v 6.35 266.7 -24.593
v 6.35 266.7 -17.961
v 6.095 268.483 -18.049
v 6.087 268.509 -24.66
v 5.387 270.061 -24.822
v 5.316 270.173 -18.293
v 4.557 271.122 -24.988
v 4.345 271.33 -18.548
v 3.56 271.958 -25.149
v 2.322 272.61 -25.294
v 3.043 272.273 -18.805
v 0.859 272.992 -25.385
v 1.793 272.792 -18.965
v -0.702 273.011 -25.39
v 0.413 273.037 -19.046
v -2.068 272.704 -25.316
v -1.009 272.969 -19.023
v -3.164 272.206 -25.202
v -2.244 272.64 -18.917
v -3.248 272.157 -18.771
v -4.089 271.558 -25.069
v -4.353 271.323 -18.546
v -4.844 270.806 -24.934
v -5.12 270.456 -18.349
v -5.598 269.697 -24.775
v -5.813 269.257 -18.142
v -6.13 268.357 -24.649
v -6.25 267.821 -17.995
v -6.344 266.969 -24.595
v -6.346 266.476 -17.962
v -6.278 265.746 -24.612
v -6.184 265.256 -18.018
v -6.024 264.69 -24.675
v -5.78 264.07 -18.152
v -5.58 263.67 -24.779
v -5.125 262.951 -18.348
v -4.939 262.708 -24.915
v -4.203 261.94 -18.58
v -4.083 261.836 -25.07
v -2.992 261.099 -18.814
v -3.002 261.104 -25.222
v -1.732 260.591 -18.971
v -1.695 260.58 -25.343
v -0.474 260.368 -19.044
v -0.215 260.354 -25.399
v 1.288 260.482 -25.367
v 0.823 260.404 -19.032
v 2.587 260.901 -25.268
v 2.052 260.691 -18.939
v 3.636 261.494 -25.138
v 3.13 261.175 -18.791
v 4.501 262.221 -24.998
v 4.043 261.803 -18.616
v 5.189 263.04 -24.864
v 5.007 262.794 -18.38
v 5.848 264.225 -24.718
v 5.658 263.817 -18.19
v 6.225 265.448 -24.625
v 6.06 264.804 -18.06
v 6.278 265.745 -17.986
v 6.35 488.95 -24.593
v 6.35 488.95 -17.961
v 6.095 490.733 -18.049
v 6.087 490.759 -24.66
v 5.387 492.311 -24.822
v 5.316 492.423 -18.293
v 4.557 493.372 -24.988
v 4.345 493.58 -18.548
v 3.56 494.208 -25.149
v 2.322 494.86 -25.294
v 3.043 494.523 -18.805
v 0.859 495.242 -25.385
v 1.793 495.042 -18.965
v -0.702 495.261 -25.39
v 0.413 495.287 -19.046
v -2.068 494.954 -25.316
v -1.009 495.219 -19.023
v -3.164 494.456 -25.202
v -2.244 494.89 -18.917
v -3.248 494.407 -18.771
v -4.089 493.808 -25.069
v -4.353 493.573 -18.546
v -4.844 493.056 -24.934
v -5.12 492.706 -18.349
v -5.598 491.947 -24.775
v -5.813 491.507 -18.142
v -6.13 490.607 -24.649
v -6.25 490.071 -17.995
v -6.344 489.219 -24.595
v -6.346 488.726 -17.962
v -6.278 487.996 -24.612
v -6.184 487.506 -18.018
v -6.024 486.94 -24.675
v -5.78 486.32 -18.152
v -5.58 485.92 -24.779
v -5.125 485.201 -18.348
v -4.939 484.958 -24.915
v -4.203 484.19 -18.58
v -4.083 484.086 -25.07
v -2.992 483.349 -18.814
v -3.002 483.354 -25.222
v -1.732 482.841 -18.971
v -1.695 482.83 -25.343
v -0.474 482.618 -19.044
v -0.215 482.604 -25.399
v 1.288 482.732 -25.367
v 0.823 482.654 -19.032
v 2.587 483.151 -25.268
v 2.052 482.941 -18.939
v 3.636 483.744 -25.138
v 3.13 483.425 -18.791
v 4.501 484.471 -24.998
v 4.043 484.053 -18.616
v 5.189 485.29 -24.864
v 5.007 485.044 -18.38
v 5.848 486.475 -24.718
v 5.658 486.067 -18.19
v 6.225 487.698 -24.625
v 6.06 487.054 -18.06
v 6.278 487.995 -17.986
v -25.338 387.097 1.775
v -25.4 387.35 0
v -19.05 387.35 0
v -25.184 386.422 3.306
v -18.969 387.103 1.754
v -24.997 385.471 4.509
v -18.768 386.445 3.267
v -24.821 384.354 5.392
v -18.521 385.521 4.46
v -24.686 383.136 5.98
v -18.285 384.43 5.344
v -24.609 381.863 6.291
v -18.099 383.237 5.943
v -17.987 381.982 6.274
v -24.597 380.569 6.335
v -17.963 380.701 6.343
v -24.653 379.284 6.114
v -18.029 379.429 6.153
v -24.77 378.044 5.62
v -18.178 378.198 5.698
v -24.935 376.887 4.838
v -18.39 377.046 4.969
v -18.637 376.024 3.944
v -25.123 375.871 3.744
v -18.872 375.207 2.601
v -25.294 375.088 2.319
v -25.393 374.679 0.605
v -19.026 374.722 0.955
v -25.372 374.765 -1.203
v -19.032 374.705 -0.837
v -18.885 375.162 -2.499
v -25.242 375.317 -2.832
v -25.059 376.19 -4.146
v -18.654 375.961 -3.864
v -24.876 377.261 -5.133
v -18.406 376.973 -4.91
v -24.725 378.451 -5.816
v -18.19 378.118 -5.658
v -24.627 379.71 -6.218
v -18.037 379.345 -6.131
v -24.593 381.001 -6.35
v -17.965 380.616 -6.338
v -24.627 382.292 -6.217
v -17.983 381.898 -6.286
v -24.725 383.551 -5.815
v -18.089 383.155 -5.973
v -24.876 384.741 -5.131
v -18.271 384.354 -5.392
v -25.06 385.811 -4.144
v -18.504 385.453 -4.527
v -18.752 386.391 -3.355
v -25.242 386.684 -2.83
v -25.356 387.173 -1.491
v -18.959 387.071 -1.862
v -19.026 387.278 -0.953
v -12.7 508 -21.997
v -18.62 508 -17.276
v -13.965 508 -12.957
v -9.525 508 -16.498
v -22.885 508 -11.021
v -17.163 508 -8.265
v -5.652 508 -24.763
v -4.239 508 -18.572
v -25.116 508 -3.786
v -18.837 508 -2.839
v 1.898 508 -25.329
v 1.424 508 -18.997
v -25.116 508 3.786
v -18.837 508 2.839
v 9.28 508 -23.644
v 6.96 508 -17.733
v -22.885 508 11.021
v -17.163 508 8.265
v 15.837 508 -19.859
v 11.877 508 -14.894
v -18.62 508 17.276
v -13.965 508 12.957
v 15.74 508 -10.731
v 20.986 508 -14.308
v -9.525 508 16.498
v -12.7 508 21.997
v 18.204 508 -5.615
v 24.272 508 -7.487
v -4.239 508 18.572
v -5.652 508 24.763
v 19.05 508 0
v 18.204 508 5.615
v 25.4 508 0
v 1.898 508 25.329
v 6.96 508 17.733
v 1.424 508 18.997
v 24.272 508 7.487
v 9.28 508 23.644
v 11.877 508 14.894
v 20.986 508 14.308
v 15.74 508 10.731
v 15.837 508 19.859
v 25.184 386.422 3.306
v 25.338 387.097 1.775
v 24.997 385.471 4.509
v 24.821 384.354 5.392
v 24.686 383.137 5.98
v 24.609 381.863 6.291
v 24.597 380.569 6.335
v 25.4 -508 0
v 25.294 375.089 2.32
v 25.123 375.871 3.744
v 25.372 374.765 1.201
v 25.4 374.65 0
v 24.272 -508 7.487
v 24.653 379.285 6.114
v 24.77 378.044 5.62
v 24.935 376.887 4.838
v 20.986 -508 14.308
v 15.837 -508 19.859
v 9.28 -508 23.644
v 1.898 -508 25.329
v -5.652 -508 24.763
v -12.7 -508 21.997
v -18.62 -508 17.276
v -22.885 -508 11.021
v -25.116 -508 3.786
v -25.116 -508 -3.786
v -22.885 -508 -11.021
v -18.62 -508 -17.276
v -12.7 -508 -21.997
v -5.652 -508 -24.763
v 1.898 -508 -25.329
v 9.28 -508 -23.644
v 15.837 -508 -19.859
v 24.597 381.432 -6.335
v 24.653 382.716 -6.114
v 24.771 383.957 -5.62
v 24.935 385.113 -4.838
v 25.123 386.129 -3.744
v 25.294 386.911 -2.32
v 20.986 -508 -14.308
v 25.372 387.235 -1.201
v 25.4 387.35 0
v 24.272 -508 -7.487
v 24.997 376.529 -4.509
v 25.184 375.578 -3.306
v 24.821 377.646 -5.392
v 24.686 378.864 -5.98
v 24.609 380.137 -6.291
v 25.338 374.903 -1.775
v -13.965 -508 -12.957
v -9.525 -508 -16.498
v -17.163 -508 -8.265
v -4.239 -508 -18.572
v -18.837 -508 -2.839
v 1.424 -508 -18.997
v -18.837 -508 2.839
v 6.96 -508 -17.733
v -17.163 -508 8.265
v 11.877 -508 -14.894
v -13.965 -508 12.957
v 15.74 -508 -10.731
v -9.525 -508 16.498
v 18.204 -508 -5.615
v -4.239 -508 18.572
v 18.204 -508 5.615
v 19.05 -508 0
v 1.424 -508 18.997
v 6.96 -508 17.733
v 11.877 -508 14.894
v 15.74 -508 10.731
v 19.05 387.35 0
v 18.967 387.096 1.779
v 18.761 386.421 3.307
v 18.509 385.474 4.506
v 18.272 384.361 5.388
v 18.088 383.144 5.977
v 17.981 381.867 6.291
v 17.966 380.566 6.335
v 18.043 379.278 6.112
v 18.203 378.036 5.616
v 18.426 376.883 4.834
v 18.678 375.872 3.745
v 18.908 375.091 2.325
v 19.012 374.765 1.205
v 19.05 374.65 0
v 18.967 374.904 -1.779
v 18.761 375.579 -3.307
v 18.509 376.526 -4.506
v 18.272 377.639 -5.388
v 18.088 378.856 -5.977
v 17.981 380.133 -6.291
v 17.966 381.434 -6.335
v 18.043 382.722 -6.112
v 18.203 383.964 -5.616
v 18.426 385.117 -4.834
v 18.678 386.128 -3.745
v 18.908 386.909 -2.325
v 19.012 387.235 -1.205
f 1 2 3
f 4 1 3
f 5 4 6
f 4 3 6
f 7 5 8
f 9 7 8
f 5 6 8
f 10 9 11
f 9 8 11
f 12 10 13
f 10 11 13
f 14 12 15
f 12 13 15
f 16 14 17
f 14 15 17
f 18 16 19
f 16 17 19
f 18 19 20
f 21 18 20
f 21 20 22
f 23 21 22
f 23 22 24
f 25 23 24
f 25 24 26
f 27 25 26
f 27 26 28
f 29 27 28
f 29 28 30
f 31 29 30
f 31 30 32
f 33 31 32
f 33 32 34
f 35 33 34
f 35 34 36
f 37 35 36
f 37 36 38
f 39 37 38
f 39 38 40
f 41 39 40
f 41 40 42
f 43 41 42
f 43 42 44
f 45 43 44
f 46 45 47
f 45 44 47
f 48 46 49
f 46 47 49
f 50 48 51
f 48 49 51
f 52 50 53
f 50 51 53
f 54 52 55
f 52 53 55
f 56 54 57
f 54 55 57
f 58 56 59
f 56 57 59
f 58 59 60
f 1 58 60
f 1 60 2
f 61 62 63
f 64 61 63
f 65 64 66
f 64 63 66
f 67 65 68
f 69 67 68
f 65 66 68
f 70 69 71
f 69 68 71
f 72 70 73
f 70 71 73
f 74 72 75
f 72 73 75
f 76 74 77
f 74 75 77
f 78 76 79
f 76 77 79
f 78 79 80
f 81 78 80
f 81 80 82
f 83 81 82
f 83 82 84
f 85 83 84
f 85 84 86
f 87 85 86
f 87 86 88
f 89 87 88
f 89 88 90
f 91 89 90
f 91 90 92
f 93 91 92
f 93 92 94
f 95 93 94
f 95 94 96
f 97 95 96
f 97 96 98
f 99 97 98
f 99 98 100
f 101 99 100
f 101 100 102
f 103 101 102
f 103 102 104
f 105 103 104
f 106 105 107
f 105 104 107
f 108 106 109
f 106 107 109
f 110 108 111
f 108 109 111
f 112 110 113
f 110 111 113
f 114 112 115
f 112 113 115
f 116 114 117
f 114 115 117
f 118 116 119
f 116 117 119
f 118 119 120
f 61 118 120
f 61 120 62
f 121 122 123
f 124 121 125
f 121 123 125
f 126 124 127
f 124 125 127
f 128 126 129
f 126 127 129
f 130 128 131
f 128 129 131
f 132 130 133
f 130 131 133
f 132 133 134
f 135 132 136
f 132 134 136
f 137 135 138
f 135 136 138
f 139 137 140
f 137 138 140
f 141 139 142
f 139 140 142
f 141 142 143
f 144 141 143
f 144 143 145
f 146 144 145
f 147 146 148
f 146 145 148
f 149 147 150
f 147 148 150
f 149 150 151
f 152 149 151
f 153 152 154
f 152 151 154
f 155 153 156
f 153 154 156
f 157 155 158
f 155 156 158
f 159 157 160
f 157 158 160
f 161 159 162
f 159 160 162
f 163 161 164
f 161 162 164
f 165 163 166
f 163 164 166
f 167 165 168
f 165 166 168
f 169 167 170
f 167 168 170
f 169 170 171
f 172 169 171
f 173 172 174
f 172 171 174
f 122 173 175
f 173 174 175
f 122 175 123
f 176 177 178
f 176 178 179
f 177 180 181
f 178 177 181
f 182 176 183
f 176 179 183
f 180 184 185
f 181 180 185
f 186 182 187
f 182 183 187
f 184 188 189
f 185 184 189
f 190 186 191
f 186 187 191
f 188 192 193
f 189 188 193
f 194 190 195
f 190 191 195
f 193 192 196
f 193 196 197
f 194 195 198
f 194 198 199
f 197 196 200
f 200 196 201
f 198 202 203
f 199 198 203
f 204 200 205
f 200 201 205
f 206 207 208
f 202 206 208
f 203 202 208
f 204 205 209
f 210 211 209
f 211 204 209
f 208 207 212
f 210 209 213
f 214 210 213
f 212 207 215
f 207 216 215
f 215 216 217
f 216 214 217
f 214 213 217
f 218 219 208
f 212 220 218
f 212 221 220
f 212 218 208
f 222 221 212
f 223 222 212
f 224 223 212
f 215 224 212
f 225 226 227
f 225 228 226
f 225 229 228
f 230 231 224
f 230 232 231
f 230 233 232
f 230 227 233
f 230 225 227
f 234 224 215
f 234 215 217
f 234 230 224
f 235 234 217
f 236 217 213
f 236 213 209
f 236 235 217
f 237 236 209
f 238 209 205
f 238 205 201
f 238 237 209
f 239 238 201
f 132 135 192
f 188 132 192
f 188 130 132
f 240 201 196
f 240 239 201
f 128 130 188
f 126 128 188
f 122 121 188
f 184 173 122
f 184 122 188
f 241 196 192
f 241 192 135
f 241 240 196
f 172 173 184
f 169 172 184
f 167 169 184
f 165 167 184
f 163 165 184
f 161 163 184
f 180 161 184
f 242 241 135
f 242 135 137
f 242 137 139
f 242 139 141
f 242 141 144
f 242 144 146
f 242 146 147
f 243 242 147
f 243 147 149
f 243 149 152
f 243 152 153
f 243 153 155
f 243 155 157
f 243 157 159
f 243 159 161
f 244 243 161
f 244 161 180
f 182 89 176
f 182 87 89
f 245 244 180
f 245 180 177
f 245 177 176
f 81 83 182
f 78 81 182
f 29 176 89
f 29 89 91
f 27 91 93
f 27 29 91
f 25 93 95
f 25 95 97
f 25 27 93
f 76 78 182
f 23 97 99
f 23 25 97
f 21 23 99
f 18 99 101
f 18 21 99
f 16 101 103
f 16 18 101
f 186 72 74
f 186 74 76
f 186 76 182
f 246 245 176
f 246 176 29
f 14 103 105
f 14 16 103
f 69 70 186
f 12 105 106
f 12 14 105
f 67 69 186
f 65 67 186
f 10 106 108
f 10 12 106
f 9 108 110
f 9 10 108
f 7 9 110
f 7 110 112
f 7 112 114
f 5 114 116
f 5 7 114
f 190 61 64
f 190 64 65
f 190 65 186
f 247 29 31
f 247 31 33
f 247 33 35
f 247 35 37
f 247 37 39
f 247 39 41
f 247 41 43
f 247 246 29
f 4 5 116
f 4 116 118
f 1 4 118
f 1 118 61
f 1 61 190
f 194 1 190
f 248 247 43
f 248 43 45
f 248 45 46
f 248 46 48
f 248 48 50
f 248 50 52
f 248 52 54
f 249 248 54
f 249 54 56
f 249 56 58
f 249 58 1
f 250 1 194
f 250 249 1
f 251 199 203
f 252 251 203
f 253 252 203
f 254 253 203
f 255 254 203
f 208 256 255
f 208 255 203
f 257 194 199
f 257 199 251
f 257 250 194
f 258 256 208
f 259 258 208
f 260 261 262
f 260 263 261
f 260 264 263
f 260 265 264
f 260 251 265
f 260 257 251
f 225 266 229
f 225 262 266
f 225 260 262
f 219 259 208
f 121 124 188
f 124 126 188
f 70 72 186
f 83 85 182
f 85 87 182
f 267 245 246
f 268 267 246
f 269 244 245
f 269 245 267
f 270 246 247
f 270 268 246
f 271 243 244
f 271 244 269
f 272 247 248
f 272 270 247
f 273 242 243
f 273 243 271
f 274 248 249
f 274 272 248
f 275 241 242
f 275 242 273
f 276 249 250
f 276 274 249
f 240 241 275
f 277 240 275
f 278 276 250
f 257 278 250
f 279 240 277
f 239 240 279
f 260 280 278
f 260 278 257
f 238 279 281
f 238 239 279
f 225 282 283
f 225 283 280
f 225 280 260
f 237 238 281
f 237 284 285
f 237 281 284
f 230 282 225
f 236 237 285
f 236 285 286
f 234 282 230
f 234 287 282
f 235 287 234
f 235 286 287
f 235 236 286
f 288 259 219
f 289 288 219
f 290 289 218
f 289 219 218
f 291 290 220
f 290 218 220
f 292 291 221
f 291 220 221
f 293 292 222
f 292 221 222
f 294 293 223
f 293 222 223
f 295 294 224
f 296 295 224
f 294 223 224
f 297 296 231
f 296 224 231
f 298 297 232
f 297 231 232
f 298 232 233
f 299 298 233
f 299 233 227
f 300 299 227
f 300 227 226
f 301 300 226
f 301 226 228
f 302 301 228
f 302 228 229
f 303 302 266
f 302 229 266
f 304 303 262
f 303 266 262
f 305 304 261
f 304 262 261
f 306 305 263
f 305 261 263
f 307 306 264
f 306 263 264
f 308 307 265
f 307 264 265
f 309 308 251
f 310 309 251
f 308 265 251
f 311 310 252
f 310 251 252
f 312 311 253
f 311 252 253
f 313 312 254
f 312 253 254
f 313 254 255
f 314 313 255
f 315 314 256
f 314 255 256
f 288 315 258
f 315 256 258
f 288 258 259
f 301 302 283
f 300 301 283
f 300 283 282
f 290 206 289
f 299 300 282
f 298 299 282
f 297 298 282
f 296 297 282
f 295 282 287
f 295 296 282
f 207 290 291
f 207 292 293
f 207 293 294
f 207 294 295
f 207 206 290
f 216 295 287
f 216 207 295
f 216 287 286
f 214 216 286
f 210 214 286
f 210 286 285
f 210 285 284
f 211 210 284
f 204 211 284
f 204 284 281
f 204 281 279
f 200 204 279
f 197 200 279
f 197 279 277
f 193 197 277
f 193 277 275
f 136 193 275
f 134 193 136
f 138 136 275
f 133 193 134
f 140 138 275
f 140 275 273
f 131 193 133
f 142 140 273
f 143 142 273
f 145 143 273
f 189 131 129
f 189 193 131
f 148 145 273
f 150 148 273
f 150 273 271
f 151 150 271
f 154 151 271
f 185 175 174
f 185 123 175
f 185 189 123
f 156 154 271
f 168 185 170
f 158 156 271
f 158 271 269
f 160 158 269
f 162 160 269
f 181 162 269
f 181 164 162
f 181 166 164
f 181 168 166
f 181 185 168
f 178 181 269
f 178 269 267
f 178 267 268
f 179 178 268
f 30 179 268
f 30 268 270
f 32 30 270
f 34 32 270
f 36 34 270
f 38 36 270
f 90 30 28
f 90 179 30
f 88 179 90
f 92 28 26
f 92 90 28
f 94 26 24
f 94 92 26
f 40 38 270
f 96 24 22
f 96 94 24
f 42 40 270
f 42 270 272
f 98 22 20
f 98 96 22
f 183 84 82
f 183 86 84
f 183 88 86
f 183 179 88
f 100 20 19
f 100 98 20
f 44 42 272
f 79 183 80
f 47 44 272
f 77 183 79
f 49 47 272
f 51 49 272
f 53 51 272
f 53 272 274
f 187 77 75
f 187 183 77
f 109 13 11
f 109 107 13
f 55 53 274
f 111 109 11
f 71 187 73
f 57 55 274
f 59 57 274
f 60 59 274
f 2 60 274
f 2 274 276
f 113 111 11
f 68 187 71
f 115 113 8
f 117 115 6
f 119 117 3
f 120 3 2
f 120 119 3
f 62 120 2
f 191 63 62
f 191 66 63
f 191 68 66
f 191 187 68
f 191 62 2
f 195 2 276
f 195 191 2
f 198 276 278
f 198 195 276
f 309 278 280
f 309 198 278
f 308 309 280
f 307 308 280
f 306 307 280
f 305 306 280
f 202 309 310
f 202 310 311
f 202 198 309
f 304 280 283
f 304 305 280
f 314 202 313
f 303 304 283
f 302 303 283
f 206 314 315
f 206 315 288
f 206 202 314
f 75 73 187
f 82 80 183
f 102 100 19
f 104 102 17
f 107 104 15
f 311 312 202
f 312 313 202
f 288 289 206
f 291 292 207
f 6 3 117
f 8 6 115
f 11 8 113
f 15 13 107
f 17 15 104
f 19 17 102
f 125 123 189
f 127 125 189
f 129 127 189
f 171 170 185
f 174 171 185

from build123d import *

# Parameters (mm, degrees)
F0_R     = 25.4
F0_R_2   = 19.05
F1_DEPTH = 508
F4_R     = 6.35
F5_DEPTH = 25.4
F3_R     = 6.35
F6_DEPTH = 25.4


with BuildPart() as f1:
    # F0 (on Front) → F1 (new body, symmetric)
    with BuildSketch(Plane.XZ):
        Circle(F0_R)
        Circle(F0_R_2, mode=Mode.SUBTRACT)
    extrude(amount=F1_DEPTH, both=True)

    # F4 (on Top) → F5 (cut)
    with BuildSketch(Plane.XY):
        with Locations((0, 488.95)):
            Circle(F4_R)
        with Locations((0, 266.7)):
            Circle(F4_R)
    extrude(amount=-F5_DEPTH, mode=Mode.SUBTRACT)

    # F3 (on Right) → F6 (cut, symmetric)
    with BuildSketch(Plane.YZ):
        with Locations((381, 0)):
            Circle(F3_R)
    extrude(amount=F6_DEPTH, both=True, mode=Mode.SUBTRACT)


solid = f1.part
